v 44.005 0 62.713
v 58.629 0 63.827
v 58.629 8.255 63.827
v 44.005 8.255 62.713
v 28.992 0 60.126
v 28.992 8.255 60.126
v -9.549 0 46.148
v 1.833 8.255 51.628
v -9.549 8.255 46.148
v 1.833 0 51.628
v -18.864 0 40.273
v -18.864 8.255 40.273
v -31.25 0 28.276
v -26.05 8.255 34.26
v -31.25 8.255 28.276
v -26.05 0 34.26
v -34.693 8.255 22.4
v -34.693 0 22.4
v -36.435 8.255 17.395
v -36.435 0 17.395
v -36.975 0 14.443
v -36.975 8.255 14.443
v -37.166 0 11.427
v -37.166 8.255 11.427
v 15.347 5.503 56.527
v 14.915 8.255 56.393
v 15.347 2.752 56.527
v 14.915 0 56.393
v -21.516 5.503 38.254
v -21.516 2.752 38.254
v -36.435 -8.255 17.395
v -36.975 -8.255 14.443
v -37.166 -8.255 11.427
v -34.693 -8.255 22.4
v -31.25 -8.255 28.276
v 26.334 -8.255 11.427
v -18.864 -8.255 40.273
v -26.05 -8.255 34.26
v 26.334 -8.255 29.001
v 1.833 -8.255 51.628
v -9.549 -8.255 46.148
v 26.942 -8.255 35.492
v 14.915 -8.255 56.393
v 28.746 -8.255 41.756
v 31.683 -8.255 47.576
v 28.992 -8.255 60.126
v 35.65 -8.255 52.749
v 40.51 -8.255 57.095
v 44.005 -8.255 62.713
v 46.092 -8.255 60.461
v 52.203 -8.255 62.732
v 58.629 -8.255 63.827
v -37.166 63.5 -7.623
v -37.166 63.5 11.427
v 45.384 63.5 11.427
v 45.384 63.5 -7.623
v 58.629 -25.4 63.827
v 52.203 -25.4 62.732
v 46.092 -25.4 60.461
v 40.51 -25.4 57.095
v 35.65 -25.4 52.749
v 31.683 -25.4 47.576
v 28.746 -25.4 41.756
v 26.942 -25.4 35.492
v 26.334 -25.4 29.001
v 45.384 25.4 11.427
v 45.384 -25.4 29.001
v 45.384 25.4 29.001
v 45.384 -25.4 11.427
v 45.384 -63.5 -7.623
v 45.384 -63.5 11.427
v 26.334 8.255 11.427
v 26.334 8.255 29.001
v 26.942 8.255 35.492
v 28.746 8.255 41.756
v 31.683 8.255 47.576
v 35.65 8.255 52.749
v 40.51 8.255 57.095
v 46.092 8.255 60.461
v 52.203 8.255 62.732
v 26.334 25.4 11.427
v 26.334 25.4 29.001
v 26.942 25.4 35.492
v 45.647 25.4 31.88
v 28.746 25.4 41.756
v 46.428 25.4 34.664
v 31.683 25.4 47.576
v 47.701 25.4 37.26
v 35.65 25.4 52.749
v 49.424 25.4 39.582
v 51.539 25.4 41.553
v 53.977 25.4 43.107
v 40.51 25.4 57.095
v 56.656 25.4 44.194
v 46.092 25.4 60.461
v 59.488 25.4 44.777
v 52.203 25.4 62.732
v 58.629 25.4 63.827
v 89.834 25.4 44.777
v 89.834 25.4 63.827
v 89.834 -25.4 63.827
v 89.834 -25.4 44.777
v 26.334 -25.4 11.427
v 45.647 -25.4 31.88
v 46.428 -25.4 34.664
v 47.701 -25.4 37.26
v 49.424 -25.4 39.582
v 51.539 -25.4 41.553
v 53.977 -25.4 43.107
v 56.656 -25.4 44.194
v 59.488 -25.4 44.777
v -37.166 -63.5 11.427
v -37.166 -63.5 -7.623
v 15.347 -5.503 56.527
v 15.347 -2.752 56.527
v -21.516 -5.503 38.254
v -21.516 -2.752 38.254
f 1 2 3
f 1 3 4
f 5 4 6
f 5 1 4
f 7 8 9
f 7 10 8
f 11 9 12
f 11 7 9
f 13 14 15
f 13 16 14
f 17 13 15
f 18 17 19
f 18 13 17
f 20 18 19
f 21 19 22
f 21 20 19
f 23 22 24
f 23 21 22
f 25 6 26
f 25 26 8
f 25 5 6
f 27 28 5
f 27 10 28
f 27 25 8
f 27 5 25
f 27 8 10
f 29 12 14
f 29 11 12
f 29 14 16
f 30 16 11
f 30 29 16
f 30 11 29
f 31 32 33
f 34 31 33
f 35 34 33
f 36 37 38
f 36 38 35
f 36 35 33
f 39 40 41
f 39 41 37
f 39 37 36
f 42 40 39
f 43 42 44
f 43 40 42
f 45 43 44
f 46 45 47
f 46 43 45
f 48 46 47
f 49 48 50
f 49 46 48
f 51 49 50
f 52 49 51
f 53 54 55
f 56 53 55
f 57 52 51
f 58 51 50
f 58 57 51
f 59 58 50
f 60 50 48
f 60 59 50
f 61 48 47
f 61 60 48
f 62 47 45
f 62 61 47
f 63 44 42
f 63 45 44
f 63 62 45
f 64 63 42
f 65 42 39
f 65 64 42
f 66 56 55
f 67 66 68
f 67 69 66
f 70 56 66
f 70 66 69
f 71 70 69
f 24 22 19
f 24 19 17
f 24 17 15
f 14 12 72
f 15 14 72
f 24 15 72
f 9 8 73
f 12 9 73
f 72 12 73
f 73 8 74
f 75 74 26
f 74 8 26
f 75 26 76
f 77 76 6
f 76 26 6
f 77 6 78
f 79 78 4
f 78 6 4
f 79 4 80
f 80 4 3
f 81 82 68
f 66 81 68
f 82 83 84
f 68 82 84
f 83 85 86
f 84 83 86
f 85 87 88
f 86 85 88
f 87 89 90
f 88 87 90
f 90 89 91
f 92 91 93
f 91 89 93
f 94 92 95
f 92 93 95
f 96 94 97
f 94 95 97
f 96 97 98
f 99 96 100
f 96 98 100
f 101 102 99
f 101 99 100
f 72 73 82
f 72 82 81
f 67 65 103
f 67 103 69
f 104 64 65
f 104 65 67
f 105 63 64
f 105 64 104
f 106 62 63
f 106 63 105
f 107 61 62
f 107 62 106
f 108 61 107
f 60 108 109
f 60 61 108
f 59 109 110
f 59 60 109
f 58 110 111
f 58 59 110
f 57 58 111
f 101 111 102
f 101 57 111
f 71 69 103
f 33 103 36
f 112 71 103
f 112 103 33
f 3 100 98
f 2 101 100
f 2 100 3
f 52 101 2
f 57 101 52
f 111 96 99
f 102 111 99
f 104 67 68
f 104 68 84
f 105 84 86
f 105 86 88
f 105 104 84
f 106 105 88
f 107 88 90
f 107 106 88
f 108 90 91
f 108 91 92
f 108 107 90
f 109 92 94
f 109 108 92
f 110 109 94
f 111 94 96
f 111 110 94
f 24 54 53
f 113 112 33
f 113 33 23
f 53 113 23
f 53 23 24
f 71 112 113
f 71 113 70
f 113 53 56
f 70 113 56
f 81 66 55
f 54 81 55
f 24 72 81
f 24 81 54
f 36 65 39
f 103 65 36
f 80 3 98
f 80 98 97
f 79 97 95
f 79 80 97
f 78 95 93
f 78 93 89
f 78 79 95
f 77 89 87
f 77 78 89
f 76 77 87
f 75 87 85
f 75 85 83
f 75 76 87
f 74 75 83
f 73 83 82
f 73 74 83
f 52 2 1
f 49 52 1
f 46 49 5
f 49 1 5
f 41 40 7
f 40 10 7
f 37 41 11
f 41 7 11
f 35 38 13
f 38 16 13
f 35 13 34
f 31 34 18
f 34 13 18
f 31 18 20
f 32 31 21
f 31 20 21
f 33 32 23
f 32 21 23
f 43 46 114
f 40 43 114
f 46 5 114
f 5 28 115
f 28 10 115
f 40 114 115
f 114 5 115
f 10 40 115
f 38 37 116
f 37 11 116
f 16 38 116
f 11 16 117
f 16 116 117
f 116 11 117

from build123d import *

# Parameters (mm, degrees)
F1_DEPTH = 63.5
F2_DEPTH = 8.255
F0_W     = 23.3708900283
F0_H     = 19.05
F3_DEPTH = 25.4


with BuildPart() as f1:
    # F0 (on Front) → F1 (new body, symmetric)
    with BuildSketch(Plane.XZ):
        Polygon((26.3337325305, 11.4268229101), (-37.1662674695, 11.4268229101), (-37.1662674695, -7.6231770899), (45.3837325305, -7.6231770899), (45.3837325305, 11.4268229101), align=None)
    extrude(amount=F1_DEPTH, both=True)

    # F0 (on Front) → F2 (join, symmetric)
    with BuildSketch(Plane.XZ):
        with BuildLine():
            add(Edge.make_bspline(
                [(58.6294981139, 63.8270229101), (17.0676354319, 62.8202483058), (-37.0535068214, 41.7246408761), (-37.1662674695, 11.4268229101)],
                knots=[0, 0, 0, 0, 109.1907031929, 109.1907031929, 109.1907031929, 109.1907031929], degree=3))
            Line((-37.1662674695, 11.4268229101), (26.3337325305, 11.4268229101))
            Line((26.3337325305, 11.4268229101), (26.3337325305, 29.0011309419))
            ThreePointArc((26.3337325305, 29.0011309419), (35.6503194891, 52.7490741476), (58.6294981139, 63.8270229101))
        make_face()
    extrude(amount=F2_DEPTH, both=True)

    # F0 (on Front) → F3 (join, symmetric)
    with BuildSketch(Plane.XZ):
        with BuildLine():
            Line((26.3337325305, 29.0011309419), (26.3337325305, 11.4268229101))
            Line((26.3337325305, 11.4268229101), (45.3837325305, 11.4268229101))
            Line((45.3837325305, 11.4268229101), (45.3837325305, 29.0011309419))
            ThreePointArc((45.3837325305, 29.0011309419), (49.4237818094, 39.5817531556), (59.4876149153, 44.7770229101))
            Line((59.4876149153, 44.7770229101), (66.4628425021, 44.7770229101))
            Line((66.4628425021, 44.7770229101), (66.4628425021, 63.8270229101))
            Line((66.4628425021, 63.8270229101), (58.6294981139, 63.8270229101))
            ThreePointArc((58.6294981139, 63.8270229101), (35.6503194891, 52.7490741476), (26.3337325305, 29.0011309419))
        make_face()
        with Locations((78.1482875163, 54.3020229101)):
            Rectangle(F0_W, F0_H)
    extrude(amount=F3_DEPTH, both=True)


solid = f1.part
